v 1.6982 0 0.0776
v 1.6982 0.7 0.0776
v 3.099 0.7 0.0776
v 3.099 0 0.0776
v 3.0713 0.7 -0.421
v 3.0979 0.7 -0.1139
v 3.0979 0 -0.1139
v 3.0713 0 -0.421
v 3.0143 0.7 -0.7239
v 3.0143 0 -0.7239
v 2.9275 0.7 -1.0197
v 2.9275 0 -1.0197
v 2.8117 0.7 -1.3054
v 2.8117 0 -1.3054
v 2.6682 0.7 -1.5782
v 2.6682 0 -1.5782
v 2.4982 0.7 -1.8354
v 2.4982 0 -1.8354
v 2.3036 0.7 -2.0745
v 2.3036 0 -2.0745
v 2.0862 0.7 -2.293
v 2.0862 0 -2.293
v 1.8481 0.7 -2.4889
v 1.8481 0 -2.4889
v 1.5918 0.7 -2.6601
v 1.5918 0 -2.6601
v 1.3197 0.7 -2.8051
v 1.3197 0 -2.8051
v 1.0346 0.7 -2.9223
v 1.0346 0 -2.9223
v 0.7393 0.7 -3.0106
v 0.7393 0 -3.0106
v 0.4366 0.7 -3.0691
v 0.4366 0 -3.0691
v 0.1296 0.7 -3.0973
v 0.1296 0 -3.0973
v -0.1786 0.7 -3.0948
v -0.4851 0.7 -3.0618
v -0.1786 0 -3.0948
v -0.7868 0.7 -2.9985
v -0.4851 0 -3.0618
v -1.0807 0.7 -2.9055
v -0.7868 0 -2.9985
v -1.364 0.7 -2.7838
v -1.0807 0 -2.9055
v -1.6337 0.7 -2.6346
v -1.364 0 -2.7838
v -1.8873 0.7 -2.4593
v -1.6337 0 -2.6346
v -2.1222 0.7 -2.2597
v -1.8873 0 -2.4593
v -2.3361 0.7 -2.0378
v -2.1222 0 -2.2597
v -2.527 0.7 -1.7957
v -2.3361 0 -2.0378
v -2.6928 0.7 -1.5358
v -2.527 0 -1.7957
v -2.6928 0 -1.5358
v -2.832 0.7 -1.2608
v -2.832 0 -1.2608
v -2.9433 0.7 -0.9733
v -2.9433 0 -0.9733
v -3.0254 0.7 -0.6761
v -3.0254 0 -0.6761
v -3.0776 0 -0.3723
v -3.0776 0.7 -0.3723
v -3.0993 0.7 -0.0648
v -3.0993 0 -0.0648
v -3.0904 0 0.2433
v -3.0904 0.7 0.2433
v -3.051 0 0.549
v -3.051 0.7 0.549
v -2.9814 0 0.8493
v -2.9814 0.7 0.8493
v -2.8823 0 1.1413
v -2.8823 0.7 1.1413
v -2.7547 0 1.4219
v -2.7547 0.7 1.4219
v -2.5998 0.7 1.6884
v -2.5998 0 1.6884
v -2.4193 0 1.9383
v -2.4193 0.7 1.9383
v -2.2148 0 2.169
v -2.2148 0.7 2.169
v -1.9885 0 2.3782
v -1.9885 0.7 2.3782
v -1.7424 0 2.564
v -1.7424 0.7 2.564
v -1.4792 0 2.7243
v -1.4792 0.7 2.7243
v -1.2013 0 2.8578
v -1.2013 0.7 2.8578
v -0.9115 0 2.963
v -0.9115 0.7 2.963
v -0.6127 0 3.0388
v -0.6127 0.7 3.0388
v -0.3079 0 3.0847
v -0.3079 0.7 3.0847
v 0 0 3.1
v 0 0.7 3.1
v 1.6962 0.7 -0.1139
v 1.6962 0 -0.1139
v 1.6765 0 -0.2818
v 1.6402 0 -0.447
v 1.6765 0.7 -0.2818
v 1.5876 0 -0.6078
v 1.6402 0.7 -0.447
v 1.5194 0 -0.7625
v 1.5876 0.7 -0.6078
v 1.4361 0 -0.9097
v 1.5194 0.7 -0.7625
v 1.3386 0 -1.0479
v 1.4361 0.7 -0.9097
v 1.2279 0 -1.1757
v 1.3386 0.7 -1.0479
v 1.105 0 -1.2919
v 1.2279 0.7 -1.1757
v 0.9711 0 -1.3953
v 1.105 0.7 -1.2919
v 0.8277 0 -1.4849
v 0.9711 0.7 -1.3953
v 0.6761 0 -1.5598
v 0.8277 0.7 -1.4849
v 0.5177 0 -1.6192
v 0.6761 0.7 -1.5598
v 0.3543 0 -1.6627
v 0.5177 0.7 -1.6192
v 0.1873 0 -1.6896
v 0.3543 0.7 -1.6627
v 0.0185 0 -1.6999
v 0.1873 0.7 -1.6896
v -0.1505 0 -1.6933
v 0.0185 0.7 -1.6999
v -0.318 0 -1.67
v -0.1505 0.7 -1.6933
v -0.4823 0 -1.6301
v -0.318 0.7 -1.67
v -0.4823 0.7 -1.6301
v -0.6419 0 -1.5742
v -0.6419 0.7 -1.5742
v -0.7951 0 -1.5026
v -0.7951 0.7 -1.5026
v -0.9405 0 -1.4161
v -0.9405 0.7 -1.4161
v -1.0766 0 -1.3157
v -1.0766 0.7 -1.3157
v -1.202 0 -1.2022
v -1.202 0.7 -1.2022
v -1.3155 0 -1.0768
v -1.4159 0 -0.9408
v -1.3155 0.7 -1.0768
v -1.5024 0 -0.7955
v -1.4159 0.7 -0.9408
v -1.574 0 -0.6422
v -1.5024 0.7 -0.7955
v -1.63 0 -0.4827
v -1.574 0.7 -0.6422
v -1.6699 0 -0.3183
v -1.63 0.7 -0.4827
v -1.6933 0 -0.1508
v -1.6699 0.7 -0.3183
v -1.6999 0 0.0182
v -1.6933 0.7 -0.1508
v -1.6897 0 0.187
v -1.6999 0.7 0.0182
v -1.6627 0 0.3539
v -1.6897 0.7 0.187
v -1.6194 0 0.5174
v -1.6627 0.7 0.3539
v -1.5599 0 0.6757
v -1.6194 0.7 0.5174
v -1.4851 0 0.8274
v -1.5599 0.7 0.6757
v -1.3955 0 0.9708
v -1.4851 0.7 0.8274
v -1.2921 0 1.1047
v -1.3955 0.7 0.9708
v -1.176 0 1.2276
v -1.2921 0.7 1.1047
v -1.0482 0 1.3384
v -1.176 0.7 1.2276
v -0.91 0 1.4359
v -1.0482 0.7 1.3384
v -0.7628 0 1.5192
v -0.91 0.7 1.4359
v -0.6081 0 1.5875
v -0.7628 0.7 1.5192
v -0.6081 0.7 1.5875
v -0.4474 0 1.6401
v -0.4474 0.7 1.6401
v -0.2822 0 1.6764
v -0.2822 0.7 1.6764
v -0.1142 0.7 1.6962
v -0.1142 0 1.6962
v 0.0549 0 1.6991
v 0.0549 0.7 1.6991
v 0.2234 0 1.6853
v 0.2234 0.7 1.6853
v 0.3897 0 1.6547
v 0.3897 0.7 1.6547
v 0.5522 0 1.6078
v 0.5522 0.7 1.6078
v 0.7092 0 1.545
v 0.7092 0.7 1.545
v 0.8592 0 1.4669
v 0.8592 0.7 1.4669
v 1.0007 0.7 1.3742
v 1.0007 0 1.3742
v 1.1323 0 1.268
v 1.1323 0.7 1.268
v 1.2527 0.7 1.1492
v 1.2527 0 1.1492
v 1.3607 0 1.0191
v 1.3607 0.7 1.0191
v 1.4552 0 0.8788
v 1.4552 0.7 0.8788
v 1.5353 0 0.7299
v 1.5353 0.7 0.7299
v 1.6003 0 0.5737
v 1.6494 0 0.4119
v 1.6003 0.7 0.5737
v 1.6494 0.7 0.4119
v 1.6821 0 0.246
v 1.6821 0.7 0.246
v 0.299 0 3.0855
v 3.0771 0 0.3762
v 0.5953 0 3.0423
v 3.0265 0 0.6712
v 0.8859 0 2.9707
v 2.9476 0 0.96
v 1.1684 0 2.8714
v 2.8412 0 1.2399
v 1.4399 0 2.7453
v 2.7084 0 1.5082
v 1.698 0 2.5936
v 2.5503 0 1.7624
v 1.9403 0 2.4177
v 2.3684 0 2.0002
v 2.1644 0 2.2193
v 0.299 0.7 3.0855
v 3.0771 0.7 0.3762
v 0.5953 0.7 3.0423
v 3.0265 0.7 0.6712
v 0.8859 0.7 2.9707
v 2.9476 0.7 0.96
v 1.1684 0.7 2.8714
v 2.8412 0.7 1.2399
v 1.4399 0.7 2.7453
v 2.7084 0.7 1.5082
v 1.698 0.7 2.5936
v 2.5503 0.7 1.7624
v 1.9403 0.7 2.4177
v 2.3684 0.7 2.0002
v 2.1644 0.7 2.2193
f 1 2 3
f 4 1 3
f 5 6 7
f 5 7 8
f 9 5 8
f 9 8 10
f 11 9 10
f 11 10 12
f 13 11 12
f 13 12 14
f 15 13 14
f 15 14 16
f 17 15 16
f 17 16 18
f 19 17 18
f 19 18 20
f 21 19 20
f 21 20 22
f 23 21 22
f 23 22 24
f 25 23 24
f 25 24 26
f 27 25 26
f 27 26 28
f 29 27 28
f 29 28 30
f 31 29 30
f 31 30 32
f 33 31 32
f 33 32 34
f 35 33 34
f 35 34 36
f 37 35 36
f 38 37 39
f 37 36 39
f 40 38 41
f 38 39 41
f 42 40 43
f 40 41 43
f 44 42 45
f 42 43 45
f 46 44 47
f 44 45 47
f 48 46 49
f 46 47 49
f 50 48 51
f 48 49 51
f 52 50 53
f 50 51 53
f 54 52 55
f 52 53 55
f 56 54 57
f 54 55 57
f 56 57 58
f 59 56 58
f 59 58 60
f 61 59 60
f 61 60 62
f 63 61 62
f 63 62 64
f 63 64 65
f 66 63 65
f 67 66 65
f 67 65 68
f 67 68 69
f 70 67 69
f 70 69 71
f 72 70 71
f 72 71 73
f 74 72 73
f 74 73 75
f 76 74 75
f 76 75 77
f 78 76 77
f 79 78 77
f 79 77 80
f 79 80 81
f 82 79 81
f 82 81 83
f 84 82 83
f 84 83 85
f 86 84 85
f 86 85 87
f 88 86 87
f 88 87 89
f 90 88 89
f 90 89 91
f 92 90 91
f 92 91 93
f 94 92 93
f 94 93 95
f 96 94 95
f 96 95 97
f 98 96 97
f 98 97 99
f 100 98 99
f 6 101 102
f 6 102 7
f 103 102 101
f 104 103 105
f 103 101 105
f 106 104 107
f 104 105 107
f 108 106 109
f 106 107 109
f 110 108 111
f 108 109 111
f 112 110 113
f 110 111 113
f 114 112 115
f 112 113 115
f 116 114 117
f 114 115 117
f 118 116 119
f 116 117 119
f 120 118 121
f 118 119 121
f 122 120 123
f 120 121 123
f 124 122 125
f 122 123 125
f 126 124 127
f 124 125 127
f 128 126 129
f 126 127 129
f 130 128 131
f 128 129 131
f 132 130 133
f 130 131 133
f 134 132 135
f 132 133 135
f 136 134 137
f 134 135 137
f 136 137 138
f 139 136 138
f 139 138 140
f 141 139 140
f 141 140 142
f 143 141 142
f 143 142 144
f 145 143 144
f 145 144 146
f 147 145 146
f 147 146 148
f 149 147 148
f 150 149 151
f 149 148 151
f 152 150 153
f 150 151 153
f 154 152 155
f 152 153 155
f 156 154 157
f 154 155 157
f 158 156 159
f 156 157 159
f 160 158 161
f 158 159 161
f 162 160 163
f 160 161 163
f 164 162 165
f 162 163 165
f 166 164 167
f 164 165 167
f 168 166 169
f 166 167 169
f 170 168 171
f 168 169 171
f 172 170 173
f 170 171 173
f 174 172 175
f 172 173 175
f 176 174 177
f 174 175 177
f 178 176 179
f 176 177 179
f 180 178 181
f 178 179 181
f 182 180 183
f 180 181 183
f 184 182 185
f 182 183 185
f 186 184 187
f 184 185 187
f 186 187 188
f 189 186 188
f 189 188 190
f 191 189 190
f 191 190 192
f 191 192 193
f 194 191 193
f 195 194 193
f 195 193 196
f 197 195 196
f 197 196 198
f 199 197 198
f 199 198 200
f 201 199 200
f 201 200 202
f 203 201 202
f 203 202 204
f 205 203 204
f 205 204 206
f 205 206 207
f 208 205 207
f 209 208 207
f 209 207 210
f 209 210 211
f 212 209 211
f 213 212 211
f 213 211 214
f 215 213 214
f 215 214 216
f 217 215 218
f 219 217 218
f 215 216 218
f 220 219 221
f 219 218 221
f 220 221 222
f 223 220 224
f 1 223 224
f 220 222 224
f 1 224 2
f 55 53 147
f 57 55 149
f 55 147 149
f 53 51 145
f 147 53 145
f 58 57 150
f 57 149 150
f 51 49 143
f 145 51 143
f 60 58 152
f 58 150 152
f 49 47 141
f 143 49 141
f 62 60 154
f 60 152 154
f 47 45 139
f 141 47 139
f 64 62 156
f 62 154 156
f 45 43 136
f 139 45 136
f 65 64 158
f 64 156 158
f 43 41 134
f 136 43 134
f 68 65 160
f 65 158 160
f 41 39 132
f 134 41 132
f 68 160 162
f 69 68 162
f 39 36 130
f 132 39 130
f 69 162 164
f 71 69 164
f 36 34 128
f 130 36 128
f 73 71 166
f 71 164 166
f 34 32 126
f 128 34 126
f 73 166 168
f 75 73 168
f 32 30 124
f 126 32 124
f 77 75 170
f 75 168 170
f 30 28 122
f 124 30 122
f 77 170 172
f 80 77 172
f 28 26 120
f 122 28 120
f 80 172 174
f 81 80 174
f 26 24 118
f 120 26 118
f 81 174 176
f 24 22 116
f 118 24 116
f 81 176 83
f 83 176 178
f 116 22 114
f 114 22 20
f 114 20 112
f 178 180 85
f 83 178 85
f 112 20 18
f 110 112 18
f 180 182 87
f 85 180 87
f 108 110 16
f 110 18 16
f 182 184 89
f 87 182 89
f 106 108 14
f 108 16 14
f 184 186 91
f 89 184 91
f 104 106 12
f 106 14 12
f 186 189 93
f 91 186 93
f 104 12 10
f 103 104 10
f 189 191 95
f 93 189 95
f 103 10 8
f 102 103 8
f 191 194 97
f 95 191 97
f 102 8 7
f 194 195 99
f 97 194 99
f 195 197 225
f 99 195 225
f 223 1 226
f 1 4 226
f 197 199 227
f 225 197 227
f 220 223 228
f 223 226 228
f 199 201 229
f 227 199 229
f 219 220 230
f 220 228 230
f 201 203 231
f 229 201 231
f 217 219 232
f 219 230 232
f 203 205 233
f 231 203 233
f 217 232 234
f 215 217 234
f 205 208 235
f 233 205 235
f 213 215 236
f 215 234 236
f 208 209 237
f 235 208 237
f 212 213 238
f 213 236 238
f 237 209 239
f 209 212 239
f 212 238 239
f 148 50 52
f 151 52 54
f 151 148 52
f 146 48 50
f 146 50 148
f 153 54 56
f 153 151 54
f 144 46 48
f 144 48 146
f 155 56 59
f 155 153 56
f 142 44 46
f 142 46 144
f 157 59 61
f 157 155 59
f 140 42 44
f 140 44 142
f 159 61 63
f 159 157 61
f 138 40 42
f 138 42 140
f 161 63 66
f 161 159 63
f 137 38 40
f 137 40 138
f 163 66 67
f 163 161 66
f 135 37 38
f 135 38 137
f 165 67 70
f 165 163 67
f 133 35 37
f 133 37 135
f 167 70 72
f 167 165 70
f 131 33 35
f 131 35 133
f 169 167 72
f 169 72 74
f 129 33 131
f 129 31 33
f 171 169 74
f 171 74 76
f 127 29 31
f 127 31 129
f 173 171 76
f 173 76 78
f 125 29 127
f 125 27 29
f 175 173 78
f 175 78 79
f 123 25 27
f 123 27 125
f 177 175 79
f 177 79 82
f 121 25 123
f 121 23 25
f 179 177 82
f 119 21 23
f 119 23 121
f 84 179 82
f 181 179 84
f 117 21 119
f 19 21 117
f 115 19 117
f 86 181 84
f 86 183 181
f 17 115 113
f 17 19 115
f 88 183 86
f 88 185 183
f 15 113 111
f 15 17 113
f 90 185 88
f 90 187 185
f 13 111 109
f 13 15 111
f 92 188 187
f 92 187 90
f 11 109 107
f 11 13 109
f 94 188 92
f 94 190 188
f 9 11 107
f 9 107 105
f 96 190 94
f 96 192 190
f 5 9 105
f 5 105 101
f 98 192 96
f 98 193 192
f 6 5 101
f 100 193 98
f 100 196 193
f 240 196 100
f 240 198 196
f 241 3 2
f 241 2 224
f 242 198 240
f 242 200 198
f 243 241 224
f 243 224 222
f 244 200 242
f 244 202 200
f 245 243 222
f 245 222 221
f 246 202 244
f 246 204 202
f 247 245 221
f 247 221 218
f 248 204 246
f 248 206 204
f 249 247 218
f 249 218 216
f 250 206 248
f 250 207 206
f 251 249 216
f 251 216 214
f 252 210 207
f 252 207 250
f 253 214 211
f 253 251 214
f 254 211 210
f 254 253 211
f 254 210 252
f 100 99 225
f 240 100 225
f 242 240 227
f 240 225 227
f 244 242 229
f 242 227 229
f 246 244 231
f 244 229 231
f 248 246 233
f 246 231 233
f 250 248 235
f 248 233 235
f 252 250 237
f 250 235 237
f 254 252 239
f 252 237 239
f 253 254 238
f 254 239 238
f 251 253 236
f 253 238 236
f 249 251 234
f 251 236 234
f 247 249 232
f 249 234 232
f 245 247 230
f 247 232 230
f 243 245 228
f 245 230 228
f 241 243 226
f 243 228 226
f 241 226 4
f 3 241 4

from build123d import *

# Parameters (mm, degrees)
SKETCH1_R          = 3.1
EXTRUDE1_DEPTH     = 0.7
SKETCH2_R          = 1.7
CUT_EXTRUDE1_DEPTH = 5.439594576
SKETCH3_W          = 1.509479926
SKETCH3_H          = 0.191482381
CUT_EXTRUDE3_DEPTH = 5.439594576


with BuildPart() as part:
    # Sketch1 → Extrude1 (new body)
    with BuildSketch(Plane(origin=(0, 0, 0), x_dir=(1, 0, 0), z_dir=(0, 1, 0))):
        with Locations(Location((0, 0, 0), (0, 0, 270))):
            Circle(SKETCH1_R)
    extrude(amount=EXTRUDE1_DEPTH)

    # Sketch2 → Cut-Extrude1 (cut, through all)
    with BuildSketch(Plane(origin=(0, 0.7, 0), x_dir=(1, 0, 0), z_dir=(0, 1, 0))):
        with Locations(Location((0, 0, 0), (0, 0, 270))):
            Circle(SKETCH2_R)
    extrude(amount=-CUT_EXTRUDE1_DEPTH, mode=Mode.SUBTRACT)

    # Sketch3 → Cut-Extrude3 (cut, through all)
    with BuildSketch(Plane(origin=(0, 0.7, 0), x_dir=(1, 0, 0), z_dir=(0, 1, 0))):
        with Locations((2.450921504, 0.018136723)):
            Rectangle(SKETCH3_W, SKETCH3_H)
    extrude(amount=-CUT_EXTRUDE3_DEPTH, mode=Mode.SUBTRACT)


solid = part.part
